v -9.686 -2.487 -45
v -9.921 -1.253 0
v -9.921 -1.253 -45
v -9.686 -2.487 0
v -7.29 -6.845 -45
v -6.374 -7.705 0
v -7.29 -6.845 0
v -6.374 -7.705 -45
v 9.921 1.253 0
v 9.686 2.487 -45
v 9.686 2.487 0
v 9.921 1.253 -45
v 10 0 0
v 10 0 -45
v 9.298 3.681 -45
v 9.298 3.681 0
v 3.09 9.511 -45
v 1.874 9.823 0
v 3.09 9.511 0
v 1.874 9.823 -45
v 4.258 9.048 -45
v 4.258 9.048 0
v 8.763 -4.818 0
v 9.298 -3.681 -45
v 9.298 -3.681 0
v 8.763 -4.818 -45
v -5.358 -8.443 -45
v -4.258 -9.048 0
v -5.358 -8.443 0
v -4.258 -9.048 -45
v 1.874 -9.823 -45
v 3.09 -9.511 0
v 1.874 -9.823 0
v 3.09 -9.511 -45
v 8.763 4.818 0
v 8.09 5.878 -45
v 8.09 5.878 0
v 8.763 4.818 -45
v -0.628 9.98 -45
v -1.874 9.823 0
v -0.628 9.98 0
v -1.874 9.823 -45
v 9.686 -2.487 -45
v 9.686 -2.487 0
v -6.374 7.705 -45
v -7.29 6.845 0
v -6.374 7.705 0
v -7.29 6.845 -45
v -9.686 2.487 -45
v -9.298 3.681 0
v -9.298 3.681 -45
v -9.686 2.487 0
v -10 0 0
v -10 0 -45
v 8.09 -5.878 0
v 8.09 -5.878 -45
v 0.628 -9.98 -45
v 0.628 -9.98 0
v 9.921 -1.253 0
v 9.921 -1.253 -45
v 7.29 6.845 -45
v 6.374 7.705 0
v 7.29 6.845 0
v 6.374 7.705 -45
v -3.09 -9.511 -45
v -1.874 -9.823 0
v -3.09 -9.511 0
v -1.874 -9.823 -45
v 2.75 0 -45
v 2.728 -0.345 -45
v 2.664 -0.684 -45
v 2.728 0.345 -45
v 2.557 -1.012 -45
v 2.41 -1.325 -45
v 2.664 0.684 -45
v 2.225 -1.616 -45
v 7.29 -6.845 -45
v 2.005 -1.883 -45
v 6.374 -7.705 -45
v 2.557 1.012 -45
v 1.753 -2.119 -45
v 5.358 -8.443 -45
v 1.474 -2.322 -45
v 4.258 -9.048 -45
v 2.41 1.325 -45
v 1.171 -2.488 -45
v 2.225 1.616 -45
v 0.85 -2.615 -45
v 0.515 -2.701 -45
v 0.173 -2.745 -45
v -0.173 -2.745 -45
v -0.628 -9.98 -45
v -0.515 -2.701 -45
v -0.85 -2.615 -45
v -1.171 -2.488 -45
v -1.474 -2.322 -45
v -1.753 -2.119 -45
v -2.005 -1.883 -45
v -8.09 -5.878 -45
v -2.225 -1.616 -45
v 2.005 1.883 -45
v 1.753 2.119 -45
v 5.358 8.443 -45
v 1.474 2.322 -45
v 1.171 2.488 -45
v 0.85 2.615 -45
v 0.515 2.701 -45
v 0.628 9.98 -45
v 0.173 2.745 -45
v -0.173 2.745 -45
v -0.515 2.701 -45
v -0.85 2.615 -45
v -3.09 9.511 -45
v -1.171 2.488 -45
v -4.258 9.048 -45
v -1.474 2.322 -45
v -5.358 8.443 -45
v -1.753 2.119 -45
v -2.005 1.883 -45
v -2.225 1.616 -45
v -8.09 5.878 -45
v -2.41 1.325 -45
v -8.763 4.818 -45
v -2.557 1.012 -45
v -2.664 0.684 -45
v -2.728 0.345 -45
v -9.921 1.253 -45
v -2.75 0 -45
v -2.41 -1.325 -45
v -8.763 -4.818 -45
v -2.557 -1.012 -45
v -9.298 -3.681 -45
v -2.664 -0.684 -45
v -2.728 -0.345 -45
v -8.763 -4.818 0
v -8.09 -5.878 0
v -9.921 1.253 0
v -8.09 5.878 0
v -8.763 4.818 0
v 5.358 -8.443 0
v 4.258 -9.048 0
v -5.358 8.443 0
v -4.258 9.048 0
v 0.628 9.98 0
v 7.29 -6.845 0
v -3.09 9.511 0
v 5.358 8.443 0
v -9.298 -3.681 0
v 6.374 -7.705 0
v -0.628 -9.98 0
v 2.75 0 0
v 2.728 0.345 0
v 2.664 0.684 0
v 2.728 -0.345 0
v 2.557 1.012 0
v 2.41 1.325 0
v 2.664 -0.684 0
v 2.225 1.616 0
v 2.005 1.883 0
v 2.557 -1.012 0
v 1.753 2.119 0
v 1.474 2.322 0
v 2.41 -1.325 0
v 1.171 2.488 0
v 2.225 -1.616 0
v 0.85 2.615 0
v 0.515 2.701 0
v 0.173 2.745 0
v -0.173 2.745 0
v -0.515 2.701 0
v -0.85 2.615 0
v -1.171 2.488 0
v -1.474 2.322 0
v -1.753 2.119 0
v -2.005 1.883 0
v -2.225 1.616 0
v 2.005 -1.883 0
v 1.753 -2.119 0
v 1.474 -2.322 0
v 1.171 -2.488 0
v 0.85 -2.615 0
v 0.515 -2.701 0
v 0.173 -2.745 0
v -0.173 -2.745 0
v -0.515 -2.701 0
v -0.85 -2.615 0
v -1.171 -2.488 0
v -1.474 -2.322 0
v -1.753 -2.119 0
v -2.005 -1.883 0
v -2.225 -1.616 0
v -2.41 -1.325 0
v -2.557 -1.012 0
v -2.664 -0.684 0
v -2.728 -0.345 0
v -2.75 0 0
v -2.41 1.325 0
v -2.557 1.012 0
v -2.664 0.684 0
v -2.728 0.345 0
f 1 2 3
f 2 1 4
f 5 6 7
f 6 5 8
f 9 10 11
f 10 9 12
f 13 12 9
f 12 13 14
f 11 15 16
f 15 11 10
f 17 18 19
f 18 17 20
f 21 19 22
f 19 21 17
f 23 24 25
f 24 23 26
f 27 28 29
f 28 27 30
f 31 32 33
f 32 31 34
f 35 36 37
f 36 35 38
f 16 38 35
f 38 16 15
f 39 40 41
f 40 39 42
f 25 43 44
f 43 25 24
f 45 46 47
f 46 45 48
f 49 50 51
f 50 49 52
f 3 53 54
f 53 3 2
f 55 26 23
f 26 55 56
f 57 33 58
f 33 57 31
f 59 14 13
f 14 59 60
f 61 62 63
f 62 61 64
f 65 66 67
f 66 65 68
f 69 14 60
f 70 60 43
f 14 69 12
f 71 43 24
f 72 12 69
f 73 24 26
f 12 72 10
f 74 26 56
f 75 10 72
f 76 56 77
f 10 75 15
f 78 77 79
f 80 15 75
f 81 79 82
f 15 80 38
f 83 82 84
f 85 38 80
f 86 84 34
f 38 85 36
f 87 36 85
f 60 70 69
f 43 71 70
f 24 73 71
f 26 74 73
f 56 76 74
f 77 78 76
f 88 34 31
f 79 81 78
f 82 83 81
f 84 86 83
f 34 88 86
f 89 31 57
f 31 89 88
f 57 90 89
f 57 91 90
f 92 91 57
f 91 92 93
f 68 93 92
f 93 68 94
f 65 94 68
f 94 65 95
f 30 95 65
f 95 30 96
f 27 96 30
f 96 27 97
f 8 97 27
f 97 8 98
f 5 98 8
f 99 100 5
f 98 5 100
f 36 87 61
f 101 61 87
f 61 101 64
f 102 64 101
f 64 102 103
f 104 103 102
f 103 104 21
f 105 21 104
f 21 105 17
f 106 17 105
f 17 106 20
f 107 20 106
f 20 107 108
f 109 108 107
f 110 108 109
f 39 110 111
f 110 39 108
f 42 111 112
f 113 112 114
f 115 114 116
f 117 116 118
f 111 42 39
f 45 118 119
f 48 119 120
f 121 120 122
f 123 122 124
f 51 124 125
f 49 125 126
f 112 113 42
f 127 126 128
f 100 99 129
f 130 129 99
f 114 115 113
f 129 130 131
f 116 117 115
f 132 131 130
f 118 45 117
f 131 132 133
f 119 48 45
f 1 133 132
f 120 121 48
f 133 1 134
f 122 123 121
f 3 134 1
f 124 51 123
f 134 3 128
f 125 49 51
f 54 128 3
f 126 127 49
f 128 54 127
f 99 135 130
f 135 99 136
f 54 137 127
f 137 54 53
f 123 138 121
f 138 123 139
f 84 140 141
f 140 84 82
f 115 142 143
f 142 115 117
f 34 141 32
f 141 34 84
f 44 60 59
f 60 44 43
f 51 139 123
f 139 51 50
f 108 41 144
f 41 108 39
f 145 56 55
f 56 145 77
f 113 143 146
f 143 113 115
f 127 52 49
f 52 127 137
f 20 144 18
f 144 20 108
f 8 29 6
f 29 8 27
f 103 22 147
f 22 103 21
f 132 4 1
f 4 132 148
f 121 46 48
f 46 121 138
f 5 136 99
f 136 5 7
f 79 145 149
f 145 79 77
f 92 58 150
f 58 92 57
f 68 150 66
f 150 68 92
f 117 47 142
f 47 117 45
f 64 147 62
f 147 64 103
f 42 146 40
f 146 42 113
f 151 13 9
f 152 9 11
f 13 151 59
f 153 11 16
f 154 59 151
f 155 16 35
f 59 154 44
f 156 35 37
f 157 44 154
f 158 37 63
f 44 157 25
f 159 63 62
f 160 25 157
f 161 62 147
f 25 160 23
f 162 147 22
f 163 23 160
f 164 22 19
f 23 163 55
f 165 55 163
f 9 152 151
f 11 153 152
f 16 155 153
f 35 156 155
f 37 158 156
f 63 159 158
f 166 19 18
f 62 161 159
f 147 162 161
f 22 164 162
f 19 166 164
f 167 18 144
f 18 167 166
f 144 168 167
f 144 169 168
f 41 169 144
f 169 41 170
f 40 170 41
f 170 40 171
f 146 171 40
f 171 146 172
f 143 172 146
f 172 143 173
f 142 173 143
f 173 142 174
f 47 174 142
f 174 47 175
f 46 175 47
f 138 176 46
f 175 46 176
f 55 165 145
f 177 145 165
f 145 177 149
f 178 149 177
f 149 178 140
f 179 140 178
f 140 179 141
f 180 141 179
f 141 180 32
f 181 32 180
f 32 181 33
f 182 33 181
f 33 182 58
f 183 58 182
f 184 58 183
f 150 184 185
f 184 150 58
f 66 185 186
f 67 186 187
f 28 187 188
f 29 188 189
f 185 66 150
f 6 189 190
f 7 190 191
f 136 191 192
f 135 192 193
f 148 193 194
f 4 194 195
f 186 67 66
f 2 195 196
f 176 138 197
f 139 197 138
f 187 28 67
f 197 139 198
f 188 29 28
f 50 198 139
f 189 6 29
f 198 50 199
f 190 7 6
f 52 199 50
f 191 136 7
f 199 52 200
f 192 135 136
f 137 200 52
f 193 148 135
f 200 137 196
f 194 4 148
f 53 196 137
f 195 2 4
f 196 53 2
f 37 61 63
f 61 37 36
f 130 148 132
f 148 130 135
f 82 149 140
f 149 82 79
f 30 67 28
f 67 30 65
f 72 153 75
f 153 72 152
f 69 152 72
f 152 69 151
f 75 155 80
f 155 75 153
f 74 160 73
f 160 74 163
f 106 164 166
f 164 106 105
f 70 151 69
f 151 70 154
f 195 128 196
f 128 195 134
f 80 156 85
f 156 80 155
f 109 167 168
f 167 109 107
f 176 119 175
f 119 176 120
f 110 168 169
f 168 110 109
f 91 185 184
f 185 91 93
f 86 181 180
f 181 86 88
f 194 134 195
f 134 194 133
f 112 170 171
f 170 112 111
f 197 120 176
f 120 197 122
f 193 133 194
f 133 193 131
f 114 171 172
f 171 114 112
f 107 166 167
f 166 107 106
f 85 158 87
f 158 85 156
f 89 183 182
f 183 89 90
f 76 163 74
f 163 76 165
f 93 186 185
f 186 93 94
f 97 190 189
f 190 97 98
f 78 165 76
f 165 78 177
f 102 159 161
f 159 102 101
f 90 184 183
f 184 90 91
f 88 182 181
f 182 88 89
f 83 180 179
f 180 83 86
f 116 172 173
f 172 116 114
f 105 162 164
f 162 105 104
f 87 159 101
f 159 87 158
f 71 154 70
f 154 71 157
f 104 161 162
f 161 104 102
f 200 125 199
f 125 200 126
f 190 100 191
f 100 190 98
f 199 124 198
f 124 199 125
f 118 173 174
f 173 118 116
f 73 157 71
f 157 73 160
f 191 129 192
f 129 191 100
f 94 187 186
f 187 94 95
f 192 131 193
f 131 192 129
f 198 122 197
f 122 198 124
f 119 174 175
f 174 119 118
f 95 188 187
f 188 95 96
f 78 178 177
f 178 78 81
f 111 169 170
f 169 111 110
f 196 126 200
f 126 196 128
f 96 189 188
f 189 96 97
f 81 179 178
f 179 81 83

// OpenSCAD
$fn = 50;


difference() {
	union() {
		translate(v = [0, 0, -45.0000000000]) {
			cylinder(h = 45, r = 10.0000000000);
		}
		cylinder(h = 0, r = 13.0000000000);
	}
	union() {
		#translate(v = [0, 0, -45]) {
			cylinder(h = 45, r = 2.7500000000);
		}
	}
}
